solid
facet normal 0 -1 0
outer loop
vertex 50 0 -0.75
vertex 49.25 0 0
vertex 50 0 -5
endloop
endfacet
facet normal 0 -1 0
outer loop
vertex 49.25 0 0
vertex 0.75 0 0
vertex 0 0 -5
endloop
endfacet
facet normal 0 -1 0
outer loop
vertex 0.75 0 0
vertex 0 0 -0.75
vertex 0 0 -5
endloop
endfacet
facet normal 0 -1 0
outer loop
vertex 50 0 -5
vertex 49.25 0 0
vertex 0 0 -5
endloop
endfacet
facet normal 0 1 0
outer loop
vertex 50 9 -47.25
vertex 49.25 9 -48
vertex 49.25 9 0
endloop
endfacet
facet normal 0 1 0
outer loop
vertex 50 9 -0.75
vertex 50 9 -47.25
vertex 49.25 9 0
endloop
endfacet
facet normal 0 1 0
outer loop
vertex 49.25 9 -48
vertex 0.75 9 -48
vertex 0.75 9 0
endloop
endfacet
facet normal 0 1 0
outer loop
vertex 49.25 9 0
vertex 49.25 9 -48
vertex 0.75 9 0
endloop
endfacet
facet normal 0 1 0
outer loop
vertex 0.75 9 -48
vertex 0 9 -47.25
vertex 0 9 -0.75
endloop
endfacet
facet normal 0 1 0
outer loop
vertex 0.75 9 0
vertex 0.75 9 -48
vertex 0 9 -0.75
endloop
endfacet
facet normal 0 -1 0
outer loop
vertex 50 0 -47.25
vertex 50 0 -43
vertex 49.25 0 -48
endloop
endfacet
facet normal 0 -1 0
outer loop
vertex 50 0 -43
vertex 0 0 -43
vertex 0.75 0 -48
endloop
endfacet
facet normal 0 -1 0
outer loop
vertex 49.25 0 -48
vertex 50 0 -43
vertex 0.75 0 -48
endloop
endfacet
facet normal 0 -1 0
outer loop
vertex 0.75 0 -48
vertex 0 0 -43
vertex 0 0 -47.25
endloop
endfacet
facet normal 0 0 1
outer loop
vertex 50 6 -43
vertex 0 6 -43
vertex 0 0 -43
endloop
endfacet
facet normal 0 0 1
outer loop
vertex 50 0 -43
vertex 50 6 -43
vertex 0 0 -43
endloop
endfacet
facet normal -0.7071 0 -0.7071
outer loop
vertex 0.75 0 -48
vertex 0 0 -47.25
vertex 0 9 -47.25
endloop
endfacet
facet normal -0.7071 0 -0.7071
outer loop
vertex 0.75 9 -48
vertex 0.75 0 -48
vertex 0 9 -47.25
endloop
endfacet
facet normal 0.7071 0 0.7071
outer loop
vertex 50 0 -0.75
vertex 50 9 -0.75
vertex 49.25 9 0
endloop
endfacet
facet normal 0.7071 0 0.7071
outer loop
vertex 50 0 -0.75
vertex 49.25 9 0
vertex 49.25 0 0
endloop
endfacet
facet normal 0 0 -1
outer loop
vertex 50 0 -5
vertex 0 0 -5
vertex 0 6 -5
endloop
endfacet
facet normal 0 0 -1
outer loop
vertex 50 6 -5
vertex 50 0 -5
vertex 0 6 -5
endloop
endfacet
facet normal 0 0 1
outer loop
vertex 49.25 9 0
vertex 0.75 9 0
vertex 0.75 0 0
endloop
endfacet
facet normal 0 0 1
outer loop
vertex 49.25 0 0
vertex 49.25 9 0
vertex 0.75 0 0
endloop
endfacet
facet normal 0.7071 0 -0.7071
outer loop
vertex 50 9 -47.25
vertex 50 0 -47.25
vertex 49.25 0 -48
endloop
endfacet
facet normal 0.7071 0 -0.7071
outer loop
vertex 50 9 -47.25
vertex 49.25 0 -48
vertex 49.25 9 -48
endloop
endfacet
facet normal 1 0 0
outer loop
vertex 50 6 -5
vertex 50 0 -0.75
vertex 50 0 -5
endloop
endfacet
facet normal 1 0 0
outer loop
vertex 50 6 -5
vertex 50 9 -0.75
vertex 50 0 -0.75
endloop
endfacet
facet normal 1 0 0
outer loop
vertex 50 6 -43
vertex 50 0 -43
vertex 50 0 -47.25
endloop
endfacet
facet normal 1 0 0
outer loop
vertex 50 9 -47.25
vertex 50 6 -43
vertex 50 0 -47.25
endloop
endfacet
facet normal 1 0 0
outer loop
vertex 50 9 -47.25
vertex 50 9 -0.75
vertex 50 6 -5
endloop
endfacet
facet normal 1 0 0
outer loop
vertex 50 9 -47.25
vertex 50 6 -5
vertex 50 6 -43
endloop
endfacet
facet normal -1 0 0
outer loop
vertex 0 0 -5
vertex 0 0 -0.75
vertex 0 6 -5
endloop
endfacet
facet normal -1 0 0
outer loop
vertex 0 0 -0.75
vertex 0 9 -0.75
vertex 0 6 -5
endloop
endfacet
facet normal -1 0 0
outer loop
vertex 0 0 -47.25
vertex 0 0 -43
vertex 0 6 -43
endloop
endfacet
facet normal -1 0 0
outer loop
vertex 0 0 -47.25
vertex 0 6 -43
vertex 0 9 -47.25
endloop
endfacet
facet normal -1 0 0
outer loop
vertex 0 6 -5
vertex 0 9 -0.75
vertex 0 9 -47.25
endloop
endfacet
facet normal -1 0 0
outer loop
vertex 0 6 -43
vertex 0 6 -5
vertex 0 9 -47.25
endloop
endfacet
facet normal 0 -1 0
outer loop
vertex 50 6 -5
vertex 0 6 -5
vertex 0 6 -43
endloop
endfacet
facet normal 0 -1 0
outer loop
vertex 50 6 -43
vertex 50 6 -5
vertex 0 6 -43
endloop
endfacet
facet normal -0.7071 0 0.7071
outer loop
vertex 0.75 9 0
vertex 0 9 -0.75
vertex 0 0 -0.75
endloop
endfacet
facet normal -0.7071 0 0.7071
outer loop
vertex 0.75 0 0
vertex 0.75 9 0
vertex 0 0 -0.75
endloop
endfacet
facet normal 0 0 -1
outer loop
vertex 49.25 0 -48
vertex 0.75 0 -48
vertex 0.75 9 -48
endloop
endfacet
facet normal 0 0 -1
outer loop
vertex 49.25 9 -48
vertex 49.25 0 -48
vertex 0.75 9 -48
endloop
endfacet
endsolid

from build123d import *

# Parameters (mm, degrees)
ESTRUSIONE_ESTRUSIONE9_DEPTH = 50
SMUSSO1_SIZE                 = 0.75


with BuildPart() as part:
    # Schizzo16 → Estrusione-Estrusione9 (new body)
    with BuildSketch(Plane(origin=(0, 0, 0), x_dir=(0, 0, -1), z_dir=(1, 0, 0))):
        Polygon((0, 0), (5, 0), (5, 6), (43, 6), (43, 0), (48, 0), (48, 9), (0, 9), align=None)
    extrude(amount=ESTRUSIONE_ESTRUSIONE9_DEPTH)

    # Smusso1
    smusso1_edges = [part.edges().sort_by_distance(p)[0] for p in [
        (0, 4.5, 0),
        (50, 4.5, -48),
        (50, 4.5, 0),
        (0, 4.5, -48),
    ]]
    chamfer(smusso1_edges, length=SMUSSO1_SIZE)


solid = part.part
